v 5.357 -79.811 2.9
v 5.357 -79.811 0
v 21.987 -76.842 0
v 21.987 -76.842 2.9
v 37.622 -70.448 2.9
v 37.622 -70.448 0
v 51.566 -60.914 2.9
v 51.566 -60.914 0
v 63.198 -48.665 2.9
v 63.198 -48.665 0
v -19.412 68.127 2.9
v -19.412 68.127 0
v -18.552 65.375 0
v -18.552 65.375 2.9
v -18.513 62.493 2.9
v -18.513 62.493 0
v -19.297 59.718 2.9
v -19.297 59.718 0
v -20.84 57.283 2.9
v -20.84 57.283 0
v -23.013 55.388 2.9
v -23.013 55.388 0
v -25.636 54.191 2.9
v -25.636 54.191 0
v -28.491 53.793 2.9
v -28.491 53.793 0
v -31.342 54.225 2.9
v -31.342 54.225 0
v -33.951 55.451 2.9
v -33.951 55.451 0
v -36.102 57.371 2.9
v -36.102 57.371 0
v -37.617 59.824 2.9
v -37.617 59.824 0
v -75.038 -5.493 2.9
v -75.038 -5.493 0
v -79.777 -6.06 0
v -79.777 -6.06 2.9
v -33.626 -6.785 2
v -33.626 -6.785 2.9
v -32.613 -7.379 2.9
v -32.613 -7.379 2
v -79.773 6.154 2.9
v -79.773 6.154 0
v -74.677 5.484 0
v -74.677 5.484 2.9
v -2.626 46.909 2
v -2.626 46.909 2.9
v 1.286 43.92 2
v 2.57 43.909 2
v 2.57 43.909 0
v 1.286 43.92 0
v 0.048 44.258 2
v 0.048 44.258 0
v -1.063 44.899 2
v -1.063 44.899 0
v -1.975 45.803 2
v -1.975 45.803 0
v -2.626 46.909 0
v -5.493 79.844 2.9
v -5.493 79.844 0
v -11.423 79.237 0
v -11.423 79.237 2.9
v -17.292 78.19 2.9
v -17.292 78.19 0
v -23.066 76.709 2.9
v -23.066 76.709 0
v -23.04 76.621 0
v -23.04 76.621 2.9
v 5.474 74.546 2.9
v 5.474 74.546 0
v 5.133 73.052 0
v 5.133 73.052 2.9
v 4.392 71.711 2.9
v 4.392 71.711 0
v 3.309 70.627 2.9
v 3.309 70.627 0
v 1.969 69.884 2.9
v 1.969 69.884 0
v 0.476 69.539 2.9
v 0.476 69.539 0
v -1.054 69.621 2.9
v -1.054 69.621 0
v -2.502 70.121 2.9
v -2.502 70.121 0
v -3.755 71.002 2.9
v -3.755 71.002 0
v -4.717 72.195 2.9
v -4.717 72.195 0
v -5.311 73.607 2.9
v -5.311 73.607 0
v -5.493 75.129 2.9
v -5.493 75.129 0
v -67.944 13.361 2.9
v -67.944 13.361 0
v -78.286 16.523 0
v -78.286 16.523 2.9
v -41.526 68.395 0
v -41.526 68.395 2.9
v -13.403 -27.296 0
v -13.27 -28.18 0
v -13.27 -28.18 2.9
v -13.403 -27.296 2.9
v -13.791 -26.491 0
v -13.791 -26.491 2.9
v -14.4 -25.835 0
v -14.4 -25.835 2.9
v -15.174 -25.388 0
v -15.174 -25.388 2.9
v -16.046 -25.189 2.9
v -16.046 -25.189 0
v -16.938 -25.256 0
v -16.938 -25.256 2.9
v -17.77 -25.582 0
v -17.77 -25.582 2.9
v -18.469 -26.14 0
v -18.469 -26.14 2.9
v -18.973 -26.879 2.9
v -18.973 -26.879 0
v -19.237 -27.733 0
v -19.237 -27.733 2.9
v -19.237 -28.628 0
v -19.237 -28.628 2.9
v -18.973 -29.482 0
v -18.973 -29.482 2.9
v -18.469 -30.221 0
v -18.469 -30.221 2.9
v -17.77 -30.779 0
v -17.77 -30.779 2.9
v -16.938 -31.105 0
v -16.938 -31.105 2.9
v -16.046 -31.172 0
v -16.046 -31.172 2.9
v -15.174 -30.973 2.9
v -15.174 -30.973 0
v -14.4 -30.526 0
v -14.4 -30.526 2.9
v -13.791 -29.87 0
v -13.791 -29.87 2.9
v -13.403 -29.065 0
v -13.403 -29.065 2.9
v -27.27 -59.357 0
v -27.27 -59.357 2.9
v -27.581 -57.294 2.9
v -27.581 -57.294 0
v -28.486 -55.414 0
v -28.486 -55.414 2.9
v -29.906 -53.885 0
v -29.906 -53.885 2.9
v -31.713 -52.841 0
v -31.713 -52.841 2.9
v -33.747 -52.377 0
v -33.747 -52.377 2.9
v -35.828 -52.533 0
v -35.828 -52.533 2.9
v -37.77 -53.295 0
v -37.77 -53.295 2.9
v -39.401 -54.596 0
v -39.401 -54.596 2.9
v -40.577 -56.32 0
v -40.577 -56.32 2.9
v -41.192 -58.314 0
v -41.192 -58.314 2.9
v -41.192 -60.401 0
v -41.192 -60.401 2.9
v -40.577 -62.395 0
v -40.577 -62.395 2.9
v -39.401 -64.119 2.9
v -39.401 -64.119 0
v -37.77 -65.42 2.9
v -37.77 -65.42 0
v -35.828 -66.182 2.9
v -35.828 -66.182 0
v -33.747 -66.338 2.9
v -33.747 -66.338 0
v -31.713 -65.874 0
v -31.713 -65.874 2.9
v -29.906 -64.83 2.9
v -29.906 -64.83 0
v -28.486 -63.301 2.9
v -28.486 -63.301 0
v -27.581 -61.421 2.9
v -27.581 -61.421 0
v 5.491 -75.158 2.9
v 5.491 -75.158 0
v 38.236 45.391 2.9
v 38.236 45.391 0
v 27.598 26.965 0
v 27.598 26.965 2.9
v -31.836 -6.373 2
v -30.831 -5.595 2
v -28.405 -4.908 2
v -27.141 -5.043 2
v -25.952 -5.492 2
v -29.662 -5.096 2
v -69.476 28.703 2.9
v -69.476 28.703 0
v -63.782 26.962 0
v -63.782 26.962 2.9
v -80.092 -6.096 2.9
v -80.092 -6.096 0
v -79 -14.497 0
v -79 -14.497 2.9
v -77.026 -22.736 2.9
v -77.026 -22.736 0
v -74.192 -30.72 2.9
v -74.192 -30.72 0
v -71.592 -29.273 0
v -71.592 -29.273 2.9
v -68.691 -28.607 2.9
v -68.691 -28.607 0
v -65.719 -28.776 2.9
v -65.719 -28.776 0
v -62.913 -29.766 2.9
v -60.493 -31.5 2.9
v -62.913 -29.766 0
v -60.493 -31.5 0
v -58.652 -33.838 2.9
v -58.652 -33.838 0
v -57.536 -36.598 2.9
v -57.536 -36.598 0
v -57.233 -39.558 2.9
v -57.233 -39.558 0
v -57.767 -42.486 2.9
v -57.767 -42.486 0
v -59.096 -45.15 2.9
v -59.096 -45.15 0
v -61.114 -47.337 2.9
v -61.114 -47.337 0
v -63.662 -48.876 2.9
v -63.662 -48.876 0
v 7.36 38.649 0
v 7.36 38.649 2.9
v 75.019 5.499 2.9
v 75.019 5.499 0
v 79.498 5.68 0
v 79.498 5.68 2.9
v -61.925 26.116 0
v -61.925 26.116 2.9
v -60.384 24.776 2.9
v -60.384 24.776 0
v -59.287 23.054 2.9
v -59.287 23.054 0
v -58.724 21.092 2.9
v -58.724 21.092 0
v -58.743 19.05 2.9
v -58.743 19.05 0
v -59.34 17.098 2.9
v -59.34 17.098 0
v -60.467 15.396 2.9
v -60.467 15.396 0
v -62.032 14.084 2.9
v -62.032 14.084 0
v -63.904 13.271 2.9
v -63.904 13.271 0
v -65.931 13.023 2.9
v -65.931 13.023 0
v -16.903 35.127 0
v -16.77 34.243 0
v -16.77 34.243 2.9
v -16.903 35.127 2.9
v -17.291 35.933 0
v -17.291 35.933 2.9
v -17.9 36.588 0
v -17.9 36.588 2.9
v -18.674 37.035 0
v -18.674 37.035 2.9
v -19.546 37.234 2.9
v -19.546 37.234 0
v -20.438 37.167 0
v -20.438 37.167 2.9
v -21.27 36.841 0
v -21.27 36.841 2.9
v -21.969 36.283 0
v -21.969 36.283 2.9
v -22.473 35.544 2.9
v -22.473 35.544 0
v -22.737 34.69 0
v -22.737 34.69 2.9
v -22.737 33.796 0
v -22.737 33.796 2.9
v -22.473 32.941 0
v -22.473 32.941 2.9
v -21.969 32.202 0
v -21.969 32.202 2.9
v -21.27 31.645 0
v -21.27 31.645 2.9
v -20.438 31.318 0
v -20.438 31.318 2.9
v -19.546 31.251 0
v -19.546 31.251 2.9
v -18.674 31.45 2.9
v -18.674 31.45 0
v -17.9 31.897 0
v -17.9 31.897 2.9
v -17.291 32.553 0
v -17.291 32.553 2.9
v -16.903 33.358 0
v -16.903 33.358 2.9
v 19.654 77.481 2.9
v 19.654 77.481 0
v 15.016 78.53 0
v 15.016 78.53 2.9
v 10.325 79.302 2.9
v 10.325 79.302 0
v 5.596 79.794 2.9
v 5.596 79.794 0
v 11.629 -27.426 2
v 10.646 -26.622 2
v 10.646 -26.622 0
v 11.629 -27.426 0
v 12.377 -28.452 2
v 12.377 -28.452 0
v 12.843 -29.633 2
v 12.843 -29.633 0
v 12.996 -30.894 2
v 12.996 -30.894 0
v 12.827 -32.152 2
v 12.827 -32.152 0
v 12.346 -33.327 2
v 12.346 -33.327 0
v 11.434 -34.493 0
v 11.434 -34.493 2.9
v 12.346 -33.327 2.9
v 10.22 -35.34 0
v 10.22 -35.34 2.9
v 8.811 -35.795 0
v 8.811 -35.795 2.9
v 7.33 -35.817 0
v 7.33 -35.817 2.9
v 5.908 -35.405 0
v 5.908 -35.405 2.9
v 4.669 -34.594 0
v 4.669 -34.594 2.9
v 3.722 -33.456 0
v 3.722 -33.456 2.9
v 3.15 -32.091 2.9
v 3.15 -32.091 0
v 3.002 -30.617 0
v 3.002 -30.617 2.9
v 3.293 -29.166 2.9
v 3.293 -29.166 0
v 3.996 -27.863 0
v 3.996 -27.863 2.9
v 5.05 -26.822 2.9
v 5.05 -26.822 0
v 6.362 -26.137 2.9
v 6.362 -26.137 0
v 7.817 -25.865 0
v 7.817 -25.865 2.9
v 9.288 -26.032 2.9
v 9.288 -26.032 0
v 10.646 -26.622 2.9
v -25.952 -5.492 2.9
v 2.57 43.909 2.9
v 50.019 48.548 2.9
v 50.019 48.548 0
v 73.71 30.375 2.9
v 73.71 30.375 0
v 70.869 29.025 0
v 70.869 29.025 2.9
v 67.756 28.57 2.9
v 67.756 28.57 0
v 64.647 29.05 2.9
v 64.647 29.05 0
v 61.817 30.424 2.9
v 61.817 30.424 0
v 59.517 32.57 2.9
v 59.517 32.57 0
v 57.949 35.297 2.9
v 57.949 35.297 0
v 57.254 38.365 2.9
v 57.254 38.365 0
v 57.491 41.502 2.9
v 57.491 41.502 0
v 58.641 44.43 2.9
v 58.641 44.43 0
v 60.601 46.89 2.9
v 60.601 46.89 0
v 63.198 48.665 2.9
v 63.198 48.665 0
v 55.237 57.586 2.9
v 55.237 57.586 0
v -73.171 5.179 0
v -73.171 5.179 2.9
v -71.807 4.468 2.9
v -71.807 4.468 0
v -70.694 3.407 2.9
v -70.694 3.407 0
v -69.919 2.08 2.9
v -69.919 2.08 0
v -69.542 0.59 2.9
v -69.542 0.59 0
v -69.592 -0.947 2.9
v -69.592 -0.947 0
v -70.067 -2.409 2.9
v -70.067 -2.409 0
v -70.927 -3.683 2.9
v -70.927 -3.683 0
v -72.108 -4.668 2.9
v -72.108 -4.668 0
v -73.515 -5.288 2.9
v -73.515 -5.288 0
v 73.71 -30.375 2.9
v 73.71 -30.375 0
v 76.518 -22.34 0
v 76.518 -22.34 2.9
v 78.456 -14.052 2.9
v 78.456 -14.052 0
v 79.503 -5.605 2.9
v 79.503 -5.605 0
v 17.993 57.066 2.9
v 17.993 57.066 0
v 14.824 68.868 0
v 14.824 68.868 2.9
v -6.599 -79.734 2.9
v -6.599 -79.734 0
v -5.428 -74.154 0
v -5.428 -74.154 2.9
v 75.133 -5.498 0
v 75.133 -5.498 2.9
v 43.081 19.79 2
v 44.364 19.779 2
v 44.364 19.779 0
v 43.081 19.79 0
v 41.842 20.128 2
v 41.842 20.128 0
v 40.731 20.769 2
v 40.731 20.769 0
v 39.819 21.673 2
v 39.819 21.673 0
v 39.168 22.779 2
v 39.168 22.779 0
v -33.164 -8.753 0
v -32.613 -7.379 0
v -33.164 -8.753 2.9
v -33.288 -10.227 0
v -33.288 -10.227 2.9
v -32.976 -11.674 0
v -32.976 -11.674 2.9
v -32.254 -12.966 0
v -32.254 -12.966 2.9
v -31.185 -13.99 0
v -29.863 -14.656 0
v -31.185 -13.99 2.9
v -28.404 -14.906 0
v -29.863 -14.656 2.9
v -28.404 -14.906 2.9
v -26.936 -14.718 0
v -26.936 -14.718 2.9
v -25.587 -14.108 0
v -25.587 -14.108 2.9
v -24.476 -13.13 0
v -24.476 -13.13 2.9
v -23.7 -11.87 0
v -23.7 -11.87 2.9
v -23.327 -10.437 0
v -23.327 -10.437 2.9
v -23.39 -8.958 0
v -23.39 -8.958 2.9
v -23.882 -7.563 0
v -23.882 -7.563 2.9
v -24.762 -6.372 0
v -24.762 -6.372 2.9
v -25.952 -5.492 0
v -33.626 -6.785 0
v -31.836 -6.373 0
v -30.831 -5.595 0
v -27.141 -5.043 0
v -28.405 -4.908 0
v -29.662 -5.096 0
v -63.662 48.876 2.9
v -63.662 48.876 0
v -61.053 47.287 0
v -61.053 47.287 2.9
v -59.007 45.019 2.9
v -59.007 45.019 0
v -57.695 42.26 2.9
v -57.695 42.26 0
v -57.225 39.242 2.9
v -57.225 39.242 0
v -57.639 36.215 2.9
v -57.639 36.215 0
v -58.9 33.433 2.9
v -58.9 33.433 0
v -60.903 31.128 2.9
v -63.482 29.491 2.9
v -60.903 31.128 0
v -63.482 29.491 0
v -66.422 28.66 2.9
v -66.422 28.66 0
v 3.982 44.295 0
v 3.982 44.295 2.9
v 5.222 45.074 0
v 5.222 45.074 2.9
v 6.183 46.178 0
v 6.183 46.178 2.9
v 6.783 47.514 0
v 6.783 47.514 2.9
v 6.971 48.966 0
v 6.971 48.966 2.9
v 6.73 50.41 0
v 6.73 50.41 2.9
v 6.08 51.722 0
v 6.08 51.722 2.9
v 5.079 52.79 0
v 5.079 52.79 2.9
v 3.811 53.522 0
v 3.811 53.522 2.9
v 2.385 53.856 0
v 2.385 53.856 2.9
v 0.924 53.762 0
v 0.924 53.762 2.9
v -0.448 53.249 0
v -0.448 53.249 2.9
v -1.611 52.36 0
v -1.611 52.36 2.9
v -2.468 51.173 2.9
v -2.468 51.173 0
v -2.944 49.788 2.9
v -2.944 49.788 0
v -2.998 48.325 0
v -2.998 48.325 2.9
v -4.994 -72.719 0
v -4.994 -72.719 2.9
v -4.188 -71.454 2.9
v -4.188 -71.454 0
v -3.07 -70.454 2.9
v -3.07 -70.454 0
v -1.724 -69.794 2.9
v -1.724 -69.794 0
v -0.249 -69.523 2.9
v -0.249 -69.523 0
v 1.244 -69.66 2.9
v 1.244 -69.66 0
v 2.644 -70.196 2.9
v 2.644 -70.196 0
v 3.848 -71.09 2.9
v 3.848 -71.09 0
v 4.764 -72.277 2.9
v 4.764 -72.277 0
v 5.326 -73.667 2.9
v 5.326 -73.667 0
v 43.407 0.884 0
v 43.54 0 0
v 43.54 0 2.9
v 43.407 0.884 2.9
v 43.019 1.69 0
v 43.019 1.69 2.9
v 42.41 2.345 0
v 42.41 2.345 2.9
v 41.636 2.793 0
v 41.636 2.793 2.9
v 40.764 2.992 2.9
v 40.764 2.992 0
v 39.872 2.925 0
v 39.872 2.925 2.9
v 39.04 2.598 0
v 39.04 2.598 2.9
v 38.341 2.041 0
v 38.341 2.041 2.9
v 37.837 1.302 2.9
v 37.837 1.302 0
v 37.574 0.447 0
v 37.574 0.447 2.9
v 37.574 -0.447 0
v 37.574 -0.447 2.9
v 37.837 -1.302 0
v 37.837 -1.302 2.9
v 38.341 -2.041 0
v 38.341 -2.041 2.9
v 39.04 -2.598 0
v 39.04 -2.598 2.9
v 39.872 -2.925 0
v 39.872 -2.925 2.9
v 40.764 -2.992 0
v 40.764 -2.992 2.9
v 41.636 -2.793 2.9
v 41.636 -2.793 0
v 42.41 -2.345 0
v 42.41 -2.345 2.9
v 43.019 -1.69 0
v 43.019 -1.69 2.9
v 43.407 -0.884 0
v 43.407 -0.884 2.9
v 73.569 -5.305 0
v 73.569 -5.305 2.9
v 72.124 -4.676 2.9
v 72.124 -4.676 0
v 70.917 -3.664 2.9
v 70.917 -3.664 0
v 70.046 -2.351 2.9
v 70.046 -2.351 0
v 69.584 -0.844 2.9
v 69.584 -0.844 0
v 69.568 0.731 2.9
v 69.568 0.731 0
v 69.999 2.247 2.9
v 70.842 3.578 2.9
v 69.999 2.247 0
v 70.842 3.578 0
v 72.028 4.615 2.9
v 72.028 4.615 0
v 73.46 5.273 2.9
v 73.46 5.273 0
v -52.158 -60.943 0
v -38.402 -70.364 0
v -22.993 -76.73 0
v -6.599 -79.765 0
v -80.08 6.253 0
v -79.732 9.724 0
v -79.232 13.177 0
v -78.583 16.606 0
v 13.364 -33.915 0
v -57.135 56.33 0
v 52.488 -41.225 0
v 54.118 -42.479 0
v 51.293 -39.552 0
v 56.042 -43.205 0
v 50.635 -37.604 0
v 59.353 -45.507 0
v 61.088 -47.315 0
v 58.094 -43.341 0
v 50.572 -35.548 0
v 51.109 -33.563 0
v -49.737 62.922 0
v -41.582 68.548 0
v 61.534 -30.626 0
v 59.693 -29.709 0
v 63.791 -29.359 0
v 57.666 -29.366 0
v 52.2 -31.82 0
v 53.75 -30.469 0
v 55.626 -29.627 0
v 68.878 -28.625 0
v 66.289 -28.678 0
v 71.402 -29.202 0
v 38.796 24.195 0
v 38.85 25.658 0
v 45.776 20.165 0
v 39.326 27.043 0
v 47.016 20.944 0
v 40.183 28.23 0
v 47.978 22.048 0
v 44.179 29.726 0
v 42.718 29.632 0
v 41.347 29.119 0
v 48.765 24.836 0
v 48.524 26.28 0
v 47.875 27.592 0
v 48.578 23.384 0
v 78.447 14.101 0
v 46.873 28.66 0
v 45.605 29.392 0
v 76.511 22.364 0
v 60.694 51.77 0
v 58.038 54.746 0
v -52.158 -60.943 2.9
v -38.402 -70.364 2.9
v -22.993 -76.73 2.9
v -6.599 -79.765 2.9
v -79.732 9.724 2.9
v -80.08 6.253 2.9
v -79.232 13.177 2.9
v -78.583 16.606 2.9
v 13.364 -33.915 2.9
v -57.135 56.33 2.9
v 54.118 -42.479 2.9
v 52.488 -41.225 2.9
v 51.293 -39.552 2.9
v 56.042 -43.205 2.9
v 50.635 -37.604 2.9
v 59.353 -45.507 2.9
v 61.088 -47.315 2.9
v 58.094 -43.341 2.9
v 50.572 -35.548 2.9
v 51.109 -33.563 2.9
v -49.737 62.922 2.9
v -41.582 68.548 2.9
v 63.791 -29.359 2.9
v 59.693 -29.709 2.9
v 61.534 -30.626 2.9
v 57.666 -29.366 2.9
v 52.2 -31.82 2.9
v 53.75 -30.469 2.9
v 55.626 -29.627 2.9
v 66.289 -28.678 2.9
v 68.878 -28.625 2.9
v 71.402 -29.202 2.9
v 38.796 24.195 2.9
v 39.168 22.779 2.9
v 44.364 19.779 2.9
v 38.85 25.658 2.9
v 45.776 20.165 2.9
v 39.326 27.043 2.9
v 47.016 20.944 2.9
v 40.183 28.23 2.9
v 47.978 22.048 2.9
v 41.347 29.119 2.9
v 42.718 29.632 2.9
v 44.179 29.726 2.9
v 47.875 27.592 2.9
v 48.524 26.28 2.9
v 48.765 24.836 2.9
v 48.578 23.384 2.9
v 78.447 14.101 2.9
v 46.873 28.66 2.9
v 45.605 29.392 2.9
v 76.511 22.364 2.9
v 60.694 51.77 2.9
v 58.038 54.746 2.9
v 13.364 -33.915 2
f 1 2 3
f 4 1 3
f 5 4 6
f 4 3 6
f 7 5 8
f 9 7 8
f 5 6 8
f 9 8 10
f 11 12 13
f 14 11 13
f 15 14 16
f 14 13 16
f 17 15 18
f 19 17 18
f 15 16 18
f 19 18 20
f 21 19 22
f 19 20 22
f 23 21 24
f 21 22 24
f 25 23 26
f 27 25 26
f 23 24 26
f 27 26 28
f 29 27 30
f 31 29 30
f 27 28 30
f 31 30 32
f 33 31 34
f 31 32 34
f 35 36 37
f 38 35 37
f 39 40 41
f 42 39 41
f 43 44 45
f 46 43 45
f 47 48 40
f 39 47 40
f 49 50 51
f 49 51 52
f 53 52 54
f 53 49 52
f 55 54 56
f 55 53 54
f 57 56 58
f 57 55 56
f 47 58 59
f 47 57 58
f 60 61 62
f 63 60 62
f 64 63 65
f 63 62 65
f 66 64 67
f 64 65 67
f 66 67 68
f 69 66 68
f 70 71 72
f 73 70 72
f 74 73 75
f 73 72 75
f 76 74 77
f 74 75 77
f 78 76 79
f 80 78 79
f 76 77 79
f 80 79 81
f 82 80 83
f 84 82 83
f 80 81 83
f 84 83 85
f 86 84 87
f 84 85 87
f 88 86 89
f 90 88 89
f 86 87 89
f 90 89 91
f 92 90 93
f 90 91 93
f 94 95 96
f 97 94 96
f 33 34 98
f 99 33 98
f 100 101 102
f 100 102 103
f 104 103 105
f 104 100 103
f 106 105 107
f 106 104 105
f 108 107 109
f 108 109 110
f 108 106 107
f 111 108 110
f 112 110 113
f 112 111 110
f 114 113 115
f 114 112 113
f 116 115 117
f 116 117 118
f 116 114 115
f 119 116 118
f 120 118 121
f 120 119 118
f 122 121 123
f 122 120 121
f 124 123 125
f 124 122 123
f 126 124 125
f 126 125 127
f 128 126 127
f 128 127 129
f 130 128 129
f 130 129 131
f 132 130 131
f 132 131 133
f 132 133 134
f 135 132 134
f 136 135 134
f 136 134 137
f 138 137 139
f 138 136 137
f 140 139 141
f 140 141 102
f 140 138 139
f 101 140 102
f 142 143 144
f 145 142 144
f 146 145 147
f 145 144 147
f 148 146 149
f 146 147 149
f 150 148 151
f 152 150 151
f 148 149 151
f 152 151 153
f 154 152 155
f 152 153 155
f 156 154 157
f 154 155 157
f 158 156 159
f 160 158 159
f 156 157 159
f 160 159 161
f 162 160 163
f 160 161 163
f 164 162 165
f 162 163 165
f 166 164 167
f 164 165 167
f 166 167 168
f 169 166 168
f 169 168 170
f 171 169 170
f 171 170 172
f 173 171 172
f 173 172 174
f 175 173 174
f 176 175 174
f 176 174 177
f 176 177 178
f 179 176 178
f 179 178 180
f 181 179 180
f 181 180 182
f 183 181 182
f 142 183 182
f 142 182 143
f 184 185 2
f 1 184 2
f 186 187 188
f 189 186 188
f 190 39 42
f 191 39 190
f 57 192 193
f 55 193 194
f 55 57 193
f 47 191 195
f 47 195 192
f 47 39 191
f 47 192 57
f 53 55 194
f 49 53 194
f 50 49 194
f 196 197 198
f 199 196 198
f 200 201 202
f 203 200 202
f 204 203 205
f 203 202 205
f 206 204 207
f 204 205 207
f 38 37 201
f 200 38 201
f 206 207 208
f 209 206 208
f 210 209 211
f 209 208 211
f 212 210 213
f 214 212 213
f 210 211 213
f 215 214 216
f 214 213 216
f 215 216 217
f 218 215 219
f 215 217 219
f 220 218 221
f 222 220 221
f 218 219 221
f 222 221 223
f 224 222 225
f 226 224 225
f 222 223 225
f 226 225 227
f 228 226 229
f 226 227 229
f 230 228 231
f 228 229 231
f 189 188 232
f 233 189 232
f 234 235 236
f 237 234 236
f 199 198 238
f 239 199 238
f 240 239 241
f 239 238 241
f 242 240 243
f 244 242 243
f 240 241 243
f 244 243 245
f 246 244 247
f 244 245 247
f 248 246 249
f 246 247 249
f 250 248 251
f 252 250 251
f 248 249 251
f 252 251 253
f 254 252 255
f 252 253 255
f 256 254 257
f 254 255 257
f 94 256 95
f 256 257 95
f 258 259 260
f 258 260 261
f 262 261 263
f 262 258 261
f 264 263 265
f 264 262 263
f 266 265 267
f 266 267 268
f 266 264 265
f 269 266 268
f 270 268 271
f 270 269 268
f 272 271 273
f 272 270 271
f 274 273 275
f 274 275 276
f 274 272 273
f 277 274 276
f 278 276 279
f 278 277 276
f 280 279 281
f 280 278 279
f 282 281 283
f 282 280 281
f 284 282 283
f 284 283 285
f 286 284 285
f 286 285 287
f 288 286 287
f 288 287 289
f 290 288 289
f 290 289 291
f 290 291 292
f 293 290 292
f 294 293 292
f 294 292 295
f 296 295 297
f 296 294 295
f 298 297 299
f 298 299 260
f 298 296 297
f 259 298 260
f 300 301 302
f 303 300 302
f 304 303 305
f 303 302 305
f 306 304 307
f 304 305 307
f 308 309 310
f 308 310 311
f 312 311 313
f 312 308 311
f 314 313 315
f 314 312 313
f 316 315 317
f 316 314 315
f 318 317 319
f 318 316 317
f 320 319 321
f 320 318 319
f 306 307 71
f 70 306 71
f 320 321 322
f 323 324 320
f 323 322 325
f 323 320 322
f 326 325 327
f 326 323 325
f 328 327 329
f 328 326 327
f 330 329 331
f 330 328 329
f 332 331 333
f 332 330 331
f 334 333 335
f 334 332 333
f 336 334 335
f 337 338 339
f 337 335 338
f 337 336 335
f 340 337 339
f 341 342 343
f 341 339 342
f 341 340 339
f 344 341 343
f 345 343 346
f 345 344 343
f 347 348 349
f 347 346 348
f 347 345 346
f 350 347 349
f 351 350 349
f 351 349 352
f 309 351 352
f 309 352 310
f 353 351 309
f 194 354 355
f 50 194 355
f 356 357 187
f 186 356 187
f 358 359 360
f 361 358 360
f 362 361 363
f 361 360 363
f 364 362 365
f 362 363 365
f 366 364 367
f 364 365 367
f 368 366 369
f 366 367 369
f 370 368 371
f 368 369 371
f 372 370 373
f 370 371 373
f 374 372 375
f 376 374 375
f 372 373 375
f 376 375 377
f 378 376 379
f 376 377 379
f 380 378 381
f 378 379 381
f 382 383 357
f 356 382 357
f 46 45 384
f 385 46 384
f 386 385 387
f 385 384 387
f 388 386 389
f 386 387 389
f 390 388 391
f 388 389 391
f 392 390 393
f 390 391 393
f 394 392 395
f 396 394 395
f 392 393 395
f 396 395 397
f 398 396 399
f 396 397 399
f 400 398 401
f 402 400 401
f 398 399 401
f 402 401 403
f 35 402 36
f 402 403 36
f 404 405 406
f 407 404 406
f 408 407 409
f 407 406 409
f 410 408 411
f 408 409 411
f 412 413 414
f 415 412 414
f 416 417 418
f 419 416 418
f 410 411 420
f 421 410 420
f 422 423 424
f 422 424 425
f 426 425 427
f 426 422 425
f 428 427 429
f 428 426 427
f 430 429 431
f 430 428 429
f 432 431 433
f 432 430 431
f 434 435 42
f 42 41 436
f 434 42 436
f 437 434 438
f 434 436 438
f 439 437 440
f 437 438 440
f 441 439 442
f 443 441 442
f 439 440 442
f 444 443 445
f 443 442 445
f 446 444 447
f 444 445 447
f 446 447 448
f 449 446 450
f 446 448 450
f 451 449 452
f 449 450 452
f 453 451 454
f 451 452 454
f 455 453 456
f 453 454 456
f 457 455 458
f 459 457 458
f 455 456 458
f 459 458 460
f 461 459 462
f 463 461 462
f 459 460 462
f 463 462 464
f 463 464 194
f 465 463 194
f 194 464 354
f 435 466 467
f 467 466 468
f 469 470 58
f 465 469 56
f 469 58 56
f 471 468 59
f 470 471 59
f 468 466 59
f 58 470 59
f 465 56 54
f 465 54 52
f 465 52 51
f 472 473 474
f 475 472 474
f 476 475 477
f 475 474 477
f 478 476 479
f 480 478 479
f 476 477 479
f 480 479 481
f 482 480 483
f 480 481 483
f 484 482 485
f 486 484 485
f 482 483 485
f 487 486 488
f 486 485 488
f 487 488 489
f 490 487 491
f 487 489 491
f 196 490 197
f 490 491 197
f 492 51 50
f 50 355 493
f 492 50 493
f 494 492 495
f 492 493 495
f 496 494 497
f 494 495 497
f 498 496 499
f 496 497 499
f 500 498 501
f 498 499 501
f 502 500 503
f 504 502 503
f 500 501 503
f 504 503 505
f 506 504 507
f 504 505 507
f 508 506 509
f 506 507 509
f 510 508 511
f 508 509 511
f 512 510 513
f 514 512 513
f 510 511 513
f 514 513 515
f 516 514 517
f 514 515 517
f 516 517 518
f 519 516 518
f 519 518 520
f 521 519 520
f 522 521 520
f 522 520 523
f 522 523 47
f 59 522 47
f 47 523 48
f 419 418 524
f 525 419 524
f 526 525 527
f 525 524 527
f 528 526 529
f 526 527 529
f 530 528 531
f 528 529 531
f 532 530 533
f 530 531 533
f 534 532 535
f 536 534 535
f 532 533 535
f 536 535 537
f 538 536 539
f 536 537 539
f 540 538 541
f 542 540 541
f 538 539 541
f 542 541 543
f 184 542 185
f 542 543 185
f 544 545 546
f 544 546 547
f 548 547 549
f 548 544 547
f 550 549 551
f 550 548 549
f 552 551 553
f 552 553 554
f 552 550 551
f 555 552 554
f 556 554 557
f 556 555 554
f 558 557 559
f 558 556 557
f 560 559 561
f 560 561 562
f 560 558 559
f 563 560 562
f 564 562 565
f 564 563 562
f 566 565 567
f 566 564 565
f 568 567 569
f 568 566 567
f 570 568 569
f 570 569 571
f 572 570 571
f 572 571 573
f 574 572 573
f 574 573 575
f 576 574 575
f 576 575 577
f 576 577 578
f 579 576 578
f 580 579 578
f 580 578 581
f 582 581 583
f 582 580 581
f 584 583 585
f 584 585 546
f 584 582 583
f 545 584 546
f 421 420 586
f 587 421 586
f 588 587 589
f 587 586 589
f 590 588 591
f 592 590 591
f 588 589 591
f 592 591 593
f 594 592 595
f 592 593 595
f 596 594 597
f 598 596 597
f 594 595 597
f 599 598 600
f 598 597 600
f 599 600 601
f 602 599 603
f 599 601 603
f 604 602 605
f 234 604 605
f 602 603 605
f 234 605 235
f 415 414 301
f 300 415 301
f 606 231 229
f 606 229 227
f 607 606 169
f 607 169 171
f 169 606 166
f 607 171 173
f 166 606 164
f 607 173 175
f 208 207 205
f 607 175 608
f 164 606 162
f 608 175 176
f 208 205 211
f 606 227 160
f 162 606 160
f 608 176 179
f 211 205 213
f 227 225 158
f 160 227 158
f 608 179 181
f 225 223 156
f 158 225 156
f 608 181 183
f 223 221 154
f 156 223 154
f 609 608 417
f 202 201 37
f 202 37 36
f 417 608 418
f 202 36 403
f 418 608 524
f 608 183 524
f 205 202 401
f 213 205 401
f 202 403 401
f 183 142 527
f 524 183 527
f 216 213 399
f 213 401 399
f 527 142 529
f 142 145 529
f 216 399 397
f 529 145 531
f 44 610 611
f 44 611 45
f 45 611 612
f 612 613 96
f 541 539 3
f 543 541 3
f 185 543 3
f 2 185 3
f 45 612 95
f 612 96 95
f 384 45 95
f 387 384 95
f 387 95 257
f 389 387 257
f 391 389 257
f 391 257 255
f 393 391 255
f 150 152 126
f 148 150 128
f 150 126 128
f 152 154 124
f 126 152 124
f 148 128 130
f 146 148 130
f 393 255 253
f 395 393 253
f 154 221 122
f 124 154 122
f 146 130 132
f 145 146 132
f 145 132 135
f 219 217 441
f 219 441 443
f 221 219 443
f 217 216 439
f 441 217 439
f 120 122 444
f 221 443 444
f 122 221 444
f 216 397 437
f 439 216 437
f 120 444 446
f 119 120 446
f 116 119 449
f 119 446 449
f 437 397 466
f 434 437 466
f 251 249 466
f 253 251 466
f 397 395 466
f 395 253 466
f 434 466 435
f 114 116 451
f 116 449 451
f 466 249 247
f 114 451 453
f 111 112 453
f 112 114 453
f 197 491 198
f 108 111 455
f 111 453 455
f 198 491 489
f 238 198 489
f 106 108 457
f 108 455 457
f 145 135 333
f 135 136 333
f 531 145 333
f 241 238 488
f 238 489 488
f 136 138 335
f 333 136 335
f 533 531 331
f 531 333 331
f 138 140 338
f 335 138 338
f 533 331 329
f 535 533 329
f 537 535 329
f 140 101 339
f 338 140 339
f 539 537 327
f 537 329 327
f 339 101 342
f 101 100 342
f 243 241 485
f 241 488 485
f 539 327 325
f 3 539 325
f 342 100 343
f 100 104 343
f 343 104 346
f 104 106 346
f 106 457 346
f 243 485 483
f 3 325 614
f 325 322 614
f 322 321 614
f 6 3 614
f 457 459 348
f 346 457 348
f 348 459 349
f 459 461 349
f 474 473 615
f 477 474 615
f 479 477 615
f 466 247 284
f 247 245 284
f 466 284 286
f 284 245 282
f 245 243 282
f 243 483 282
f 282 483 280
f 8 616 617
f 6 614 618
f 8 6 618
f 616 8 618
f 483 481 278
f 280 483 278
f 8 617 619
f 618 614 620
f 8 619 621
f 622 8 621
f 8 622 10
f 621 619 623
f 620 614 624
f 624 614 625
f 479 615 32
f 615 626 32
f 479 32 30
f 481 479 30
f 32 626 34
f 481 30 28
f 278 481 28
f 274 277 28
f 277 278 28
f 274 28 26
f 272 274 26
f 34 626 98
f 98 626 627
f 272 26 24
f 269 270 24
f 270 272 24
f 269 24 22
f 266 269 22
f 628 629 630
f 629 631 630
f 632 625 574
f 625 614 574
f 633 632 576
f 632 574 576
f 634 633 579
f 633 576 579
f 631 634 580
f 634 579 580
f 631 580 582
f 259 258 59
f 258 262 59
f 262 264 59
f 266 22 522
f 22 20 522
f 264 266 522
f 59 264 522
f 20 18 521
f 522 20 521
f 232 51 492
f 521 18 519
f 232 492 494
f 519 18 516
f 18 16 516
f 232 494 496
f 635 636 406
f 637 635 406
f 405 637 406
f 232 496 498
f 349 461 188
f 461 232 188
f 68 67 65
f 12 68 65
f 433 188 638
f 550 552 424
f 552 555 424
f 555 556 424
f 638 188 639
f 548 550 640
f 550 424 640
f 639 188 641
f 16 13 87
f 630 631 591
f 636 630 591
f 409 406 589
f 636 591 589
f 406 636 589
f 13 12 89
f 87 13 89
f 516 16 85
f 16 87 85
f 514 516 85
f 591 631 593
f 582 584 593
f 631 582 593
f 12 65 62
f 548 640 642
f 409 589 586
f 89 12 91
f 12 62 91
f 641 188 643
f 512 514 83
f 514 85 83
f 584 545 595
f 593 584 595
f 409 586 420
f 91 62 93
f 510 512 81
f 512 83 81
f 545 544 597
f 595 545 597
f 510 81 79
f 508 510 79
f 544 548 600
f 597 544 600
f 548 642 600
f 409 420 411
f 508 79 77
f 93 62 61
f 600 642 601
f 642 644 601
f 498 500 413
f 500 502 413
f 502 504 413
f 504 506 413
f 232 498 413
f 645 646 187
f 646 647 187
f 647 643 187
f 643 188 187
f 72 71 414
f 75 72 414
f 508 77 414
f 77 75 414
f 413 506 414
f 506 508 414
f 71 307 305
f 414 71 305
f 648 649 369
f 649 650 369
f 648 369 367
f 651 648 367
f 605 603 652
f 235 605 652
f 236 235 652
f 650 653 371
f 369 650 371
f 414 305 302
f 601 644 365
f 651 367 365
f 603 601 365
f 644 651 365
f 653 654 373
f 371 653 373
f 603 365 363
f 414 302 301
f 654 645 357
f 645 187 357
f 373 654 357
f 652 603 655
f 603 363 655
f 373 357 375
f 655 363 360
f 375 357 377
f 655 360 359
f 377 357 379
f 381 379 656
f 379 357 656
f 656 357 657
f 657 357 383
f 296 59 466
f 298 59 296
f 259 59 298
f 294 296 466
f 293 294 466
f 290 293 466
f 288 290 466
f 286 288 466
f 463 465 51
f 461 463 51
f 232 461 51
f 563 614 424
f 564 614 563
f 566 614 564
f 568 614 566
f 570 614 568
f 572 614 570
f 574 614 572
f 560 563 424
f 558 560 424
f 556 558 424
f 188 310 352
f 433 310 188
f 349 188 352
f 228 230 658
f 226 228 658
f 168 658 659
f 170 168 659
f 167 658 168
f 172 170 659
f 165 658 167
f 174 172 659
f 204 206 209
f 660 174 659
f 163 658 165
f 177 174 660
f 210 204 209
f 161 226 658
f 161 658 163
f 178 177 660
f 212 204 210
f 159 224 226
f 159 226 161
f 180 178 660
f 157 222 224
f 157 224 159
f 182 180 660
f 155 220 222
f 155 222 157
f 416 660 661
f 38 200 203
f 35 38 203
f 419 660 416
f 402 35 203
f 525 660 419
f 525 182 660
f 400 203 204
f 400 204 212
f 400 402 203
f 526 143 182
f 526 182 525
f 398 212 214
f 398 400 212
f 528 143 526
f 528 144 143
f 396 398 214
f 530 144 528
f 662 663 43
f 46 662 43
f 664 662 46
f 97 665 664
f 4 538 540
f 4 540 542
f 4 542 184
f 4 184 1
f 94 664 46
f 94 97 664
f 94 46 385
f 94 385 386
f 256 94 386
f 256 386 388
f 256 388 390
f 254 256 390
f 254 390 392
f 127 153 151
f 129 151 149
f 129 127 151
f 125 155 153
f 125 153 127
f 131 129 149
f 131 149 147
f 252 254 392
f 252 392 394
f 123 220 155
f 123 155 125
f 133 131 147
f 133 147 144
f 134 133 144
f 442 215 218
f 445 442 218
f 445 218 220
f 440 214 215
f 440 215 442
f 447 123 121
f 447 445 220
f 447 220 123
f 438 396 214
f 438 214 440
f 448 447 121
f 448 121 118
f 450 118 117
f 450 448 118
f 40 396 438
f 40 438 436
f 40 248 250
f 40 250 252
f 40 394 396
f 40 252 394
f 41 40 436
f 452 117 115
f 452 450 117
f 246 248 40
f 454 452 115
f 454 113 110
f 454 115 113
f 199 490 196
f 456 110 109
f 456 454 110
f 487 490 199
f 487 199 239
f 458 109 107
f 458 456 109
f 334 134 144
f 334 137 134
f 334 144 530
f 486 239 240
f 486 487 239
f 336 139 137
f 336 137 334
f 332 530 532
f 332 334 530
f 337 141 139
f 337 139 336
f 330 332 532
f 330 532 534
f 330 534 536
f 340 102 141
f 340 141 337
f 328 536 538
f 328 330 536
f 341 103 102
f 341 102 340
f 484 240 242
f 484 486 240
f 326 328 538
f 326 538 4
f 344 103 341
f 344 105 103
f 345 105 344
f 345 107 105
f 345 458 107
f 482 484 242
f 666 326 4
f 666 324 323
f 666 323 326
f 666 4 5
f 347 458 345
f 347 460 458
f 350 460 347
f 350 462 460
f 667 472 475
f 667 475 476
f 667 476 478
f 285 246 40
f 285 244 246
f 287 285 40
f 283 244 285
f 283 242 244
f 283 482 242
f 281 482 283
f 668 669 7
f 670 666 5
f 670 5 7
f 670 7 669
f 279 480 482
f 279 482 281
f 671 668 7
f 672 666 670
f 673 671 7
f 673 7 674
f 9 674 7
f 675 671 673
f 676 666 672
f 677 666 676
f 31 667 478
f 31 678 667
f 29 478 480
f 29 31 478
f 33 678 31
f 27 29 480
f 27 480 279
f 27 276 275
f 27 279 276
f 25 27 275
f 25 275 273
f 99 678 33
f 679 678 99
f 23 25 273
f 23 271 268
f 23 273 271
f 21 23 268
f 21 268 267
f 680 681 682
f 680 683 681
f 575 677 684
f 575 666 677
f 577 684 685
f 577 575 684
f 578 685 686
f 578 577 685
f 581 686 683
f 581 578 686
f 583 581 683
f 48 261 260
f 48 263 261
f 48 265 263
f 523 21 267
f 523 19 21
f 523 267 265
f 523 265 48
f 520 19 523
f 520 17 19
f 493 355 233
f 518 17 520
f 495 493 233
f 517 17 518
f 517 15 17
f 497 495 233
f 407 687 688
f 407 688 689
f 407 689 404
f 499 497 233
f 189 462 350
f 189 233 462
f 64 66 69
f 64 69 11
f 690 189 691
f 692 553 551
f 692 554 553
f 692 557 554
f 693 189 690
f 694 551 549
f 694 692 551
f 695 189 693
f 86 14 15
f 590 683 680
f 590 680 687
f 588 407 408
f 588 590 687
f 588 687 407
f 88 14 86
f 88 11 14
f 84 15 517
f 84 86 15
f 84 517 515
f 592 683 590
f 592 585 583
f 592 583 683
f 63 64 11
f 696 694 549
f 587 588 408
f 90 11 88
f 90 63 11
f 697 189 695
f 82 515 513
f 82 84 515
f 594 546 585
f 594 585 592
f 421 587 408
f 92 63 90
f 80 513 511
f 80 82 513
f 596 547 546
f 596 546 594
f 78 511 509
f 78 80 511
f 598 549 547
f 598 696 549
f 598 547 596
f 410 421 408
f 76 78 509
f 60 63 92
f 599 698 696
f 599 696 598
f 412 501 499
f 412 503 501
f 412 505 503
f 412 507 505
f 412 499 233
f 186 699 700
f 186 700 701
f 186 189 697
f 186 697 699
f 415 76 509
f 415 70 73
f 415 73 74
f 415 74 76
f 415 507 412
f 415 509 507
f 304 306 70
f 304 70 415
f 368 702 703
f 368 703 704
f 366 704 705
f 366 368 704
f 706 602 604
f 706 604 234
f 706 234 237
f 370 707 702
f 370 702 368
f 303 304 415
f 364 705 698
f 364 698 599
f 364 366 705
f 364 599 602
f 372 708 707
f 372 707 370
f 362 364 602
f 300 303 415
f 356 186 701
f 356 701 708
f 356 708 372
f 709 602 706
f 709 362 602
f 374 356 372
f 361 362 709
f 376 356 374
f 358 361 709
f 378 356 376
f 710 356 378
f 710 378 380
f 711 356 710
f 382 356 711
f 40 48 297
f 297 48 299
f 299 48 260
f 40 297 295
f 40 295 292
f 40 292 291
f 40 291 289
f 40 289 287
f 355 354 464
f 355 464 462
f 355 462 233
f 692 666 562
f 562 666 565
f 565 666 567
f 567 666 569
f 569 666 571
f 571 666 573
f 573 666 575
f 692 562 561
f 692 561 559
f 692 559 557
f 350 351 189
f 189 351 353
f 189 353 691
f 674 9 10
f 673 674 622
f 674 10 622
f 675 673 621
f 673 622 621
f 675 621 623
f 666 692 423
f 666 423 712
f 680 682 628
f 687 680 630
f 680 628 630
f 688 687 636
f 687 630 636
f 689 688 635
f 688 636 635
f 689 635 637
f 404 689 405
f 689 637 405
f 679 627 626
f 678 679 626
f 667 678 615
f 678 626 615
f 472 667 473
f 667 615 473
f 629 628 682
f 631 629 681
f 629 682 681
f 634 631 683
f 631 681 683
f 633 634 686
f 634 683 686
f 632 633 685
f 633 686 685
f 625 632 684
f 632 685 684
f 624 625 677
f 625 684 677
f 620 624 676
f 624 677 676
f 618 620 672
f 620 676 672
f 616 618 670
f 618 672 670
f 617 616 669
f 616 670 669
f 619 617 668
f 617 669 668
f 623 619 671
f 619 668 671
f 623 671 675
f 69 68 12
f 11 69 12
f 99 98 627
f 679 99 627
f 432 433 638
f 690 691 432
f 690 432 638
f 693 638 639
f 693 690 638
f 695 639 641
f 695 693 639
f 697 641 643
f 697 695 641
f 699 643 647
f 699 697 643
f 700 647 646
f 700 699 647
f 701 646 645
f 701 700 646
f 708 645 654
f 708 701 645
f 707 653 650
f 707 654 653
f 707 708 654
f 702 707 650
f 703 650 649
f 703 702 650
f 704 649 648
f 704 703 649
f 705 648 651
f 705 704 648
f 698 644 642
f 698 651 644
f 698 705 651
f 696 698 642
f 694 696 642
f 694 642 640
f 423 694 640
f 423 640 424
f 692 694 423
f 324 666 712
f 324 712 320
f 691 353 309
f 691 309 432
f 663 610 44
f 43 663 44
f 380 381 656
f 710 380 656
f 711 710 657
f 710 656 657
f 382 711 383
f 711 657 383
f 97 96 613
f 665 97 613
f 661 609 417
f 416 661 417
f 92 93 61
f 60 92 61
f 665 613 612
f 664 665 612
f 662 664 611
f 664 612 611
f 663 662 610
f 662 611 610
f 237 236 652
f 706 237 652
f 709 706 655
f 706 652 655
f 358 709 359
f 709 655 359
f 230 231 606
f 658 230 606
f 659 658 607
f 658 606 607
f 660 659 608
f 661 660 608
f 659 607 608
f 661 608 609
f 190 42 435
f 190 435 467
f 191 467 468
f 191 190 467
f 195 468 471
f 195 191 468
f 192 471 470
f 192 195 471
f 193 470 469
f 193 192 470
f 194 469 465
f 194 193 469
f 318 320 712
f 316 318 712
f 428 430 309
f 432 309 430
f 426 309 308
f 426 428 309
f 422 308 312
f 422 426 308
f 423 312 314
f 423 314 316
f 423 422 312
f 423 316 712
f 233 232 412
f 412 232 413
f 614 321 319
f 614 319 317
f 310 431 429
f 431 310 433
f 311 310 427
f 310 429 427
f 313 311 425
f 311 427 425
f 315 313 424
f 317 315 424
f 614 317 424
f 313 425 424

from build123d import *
from build123d.topology import SkipClean

# Parameters (mm, degrees)
SZKIC1_R                    = 3
DODANIE_WYCI_GNI_CIE1_DEPTH = 2.9
CUT_EXTRUDE1_DEPTH          = 114.129457027
BOSS_EXTRUDE1_START         = -2
BOSS_EXTRUDE1_DEPTH         = 2
SKETCH4_R                   = 7
CUT_EXTRUDE2_DEPTH          = 114.129457027


with BuildPart() as part:
    # Szkic1 → Dodanie-wyciągnięcie1 (new body)
    with BuildSketch(Plane.XY):
        with BuildLine():
            Line((5.59608992, 79.7936944), (5.474471245, 74.546001301))
            ThreePointArc((5.474471245, 74.546001301), (-0.291440696, 69.526456585), (-5.49285922, 75.12885027))
            Line((-5.49285922, 75.12885027), (-5.49285922, 79.844283988))
            ThreePointArc((-5.49285922, 79.844283988), (-14.367089706, 78.768108258), (-23.065888919, 76.708736224))
            Line((-23.065888919, 76.708736224), (-23.039986666, 76.621411569))
            Line((-23.039986666, 76.621411569), (-19.411565048, 68.127477703))
            ThreePointArc((-19.411565048, 68.127477703), (-24.281118736, 54.694699487), (-37.616696357, 59.824461002))
            Line((-37.616696357, 59.824461002), (-41.525713683, 68.39534268))
            Line((-41.525713683, 68.39534268), (-41.581780451, 68.547753974))
            ThreePointArc((-41.581780451, 68.547753974), (-53.538529253, 59.740594559), (-63.661784759, 48.875531428))
            ThreePointArc((-63.661784759, 48.875531428), (-57.63860389, 36.215421703), (-69.476005411, 28.703230861))
            Line((-69.476005411, 28.703230861), (-63.782348494, 26.96242314))
            ThreePointArc((-63.782348494, 26.96242314), (-58.970954639, 18.052629351), (-67.944384326, 13.360988291))
            Line((-67.944384326, 13.360988291), (-78.286081853, 16.522911699))
            Line((-78.286081853, 16.522911699), (-78.582583175, 16.605553861))
            ThreePointArc((-78.582583175, 16.605553861), (-79.500655067, 11.453666872), (-80.079993893, 6.252785978))
            Line((-80.079993893, 6.252785978), (-79.77300326, 6.154050162))
            Line((-79.77300326, 6.154050162), (-74.677344042, 5.483608926))
            ThreePointArc((-74.677344042, 5.483608926), (-69.513002092, -0.180404237), (-75.038066691, -5.493137439))
            Line((-75.038066691, -5.493137439), (-79.77687053, -6.060366735))
            Line((-79.77687053, -6.060366735), (-80.092161675, -6.095570053))
            ThreePointArc((-80.092161675, -6.095570053), (-78.122473499, -18.642914619), (-74.192138812, -30.72049701))
            ThreePointArc((-74.192138812, -30.72049701), (-58.652296854, -33.838462178), (-63.661783627, -48.875530946))
            ThreePointArc((-63.661783627, -48.875530946), (-38.402330015, -70.364141863), (-6.599369234, -79.764784472))
            Line((-6.599369234, -79.764784472), (-6.599369234, -79.734091682))
            Line((-6.599369234, -79.734091682), (-5.427735296, -74.153881943))
            ThreePointArc((-5.427735296, -74.153881943), (0.501919726, -69.539966289), (5.491002421, -75.157624183))
            Line((5.491002421, -75.157624183), (5.357427391, -79.811006311))
            ThreePointArc((5.357427391, -79.811006311), (37.621821152, -70.448066311), (63.198431202, -48.665211389))
            ThreePointArc((63.198431202, -48.665211389), (58.631189133, -33.87502124), (73.70968686, -30.375259673))
            ThreePointArc((73.70968686, -30.375259673), (77.597084263, -18.221882556), (79.503058016, -5.605080347))
            Line((79.503058016, -5.605080347), (75.132623878, -5.498149954))
            ThreePointArc((75.132623878, -5.498149954), (69.518937549, -0.057178034), (75.019100209, 5.498527174))
            Line((75.019100209, 5.498527174), (79.497785184, 5.679667972))
            ThreePointArc((79.497785184, 5.679667972), (77.588561718, 18.258285206), (73.709687487, 30.375260095))
            ThreePointArc((73.709687487, 30.375260095), (58.631189019, 33.875021437), (63.198432292, 48.665211915))
            ThreePointArc((63.198432292, 48.665211915), (59.384670175, 53.274660922), (55.237154752, 57.586263576))
            Line((55.237154752, 57.586263576), (50.019107731, 48.548341019))
            Line((50.019107731, 48.548341019), (38.235772571, 45.391005879))
            Line((38.235772571, 45.391005879), (27.597522321, 26.965015942))
            Line((27.597522321, 26.965015942), (7.360240685, 38.649015942))
            Line((7.360240685, 38.649015942), (17.993490945, 57.066345642))
            Line((17.993490945, 57.066345642), (14.823837521, 68.868339749))
            Line((14.823837521, 68.868339749), (19.653558746, 77.480969916))
            ThreePointArc((19.653558746, 77.480969916), (12.67640031, 78.950827209), (5.59608992, 79.7936944))
        make_face()
        with Locations((-16.270008662, -28.180480518)):
            Circle(SZKIC1_R, mode=Mode.SUBTRACT)
        with Locations((40.540020027, 1.11e-07)):
            Circle(SZKIC1_R, mode=Mode.SUBTRACT)
        with Locations((-19.770010135, 34.242663145)):
            Circle(SZKIC1_R, mode=Mode.SUBTRACT)
    extrude(amount=DODANIE_WYCI_GNI_CIE1_DEPTH)

    # Sketch2 → Cut-Extrude1 (cut, through all)
    with BuildSketch(Plane.XY.offset(2.9)):
        with BuildLine():
            Line((44.364070916, 19.778823857), (13.364070916, -33.914751178))
            Line((13.364070916, -33.914751178), (12.3463525, -33.327171176))
            ThreePointArc((12.3463525, -33.327171176), (3.149700914, -32.090654364), (10.646386774, -26.62191819))
            Line((10.646386774, -26.62191819), (39.167918493, 22.778823857))
            ThreePointArc((39.167918493, 22.778823857), (46.265994705, 29.073052491), (44.364070916, 19.778823857))
        make_face()
        with BuildLine():
            Line((-33.626467493, -6.784751178), (-32.612602806, -7.378895826))
            ThreePointArc((-32.612602806, -7.378895826), (-26.935905927, -14.717570636), (-25.95184679, -5.49191819))
            Line((-25.95184679, -5.49191819), (2.569684929, 43.908823857))
            ThreePointArc((2.569684929, 43.908823857), (4.471608718, 53.203052491), (-2.626467493, 46.908823857))
            Line((-2.626467493, 46.908823857), (-33.626467493, -6.784751178))
        make_face()
    extrude(amount=-CUT_EXTRUDE1_DEPTH, mode=Mode.SUBTRACT)

    # Sketch3 → Boss-Extrude1 (add)
    with SkipClean():  # the faces are left unmerged after this step: merging them gives an invalid solid
        with BuildSketch(Plane(origin=(0, 0, 0), x_dir=(-1, 0, 0), z_dir=(0, 0, -1)).offset(BOSS_EXTRUDE1_START)):
            with BuildLine():
                Line((2.626467493, 46.908823857), (33.626467493, -6.784751178))
                Line((33.626467493, -6.784751178), (32.612602806, -7.378895826))
                ThreePointArc((32.612602806, -7.378895826), (29.661615324, -5.096213752), (25.95184679, -5.49191819))
                Line((25.95184679, -5.49191819), (-2.569684929, 43.908823857))
                ThreePointArc((-2.569684929, 43.908823857), (0.528391282, 44.542798453), (2.626467493, 46.908823857))
            make_face()
            with BuildLine():
                Line((-39.167918493, 22.778823857), (-10.646386774, -26.62191819))
                ThreePointArc((-10.646386774, -26.62191819), (-12.843027181, -29.633130023), (-12.3463525, -33.327171176))
                Line((-12.3463525, -33.327171176), (-13.364070916, -33.914751178))
                Line((-13.364070916, -33.914751178), (-44.364070916, 19.778823857))
                ThreePointArc((-44.364070916, 19.778823857), (-41.265994705, 20.412798453), (-39.167918493, 22.778823857))
            make_face()
        extrude(amount=BOSS_EXTRUDE1_DEPTH)

    # Sketch4 → Cut-Extrude2 (cut, through all)
    with SkipClean():  # the faces are left unmerged after this step: merging them gives an invalid solid
        with BuildSketch(Plane.XY.offset(2.9)):
            with Locations((-34.270008175, -59.357395336)):
                Circle(SKETCH4_R)
            with Locations((57.524732512, -36.364240597)):
                Circle(SKETCH4_R)
        extrude(amount=-CUT_EXTRUDE2_DEPTH, mode=Mode.SUBTRACT)


solid = part.part
